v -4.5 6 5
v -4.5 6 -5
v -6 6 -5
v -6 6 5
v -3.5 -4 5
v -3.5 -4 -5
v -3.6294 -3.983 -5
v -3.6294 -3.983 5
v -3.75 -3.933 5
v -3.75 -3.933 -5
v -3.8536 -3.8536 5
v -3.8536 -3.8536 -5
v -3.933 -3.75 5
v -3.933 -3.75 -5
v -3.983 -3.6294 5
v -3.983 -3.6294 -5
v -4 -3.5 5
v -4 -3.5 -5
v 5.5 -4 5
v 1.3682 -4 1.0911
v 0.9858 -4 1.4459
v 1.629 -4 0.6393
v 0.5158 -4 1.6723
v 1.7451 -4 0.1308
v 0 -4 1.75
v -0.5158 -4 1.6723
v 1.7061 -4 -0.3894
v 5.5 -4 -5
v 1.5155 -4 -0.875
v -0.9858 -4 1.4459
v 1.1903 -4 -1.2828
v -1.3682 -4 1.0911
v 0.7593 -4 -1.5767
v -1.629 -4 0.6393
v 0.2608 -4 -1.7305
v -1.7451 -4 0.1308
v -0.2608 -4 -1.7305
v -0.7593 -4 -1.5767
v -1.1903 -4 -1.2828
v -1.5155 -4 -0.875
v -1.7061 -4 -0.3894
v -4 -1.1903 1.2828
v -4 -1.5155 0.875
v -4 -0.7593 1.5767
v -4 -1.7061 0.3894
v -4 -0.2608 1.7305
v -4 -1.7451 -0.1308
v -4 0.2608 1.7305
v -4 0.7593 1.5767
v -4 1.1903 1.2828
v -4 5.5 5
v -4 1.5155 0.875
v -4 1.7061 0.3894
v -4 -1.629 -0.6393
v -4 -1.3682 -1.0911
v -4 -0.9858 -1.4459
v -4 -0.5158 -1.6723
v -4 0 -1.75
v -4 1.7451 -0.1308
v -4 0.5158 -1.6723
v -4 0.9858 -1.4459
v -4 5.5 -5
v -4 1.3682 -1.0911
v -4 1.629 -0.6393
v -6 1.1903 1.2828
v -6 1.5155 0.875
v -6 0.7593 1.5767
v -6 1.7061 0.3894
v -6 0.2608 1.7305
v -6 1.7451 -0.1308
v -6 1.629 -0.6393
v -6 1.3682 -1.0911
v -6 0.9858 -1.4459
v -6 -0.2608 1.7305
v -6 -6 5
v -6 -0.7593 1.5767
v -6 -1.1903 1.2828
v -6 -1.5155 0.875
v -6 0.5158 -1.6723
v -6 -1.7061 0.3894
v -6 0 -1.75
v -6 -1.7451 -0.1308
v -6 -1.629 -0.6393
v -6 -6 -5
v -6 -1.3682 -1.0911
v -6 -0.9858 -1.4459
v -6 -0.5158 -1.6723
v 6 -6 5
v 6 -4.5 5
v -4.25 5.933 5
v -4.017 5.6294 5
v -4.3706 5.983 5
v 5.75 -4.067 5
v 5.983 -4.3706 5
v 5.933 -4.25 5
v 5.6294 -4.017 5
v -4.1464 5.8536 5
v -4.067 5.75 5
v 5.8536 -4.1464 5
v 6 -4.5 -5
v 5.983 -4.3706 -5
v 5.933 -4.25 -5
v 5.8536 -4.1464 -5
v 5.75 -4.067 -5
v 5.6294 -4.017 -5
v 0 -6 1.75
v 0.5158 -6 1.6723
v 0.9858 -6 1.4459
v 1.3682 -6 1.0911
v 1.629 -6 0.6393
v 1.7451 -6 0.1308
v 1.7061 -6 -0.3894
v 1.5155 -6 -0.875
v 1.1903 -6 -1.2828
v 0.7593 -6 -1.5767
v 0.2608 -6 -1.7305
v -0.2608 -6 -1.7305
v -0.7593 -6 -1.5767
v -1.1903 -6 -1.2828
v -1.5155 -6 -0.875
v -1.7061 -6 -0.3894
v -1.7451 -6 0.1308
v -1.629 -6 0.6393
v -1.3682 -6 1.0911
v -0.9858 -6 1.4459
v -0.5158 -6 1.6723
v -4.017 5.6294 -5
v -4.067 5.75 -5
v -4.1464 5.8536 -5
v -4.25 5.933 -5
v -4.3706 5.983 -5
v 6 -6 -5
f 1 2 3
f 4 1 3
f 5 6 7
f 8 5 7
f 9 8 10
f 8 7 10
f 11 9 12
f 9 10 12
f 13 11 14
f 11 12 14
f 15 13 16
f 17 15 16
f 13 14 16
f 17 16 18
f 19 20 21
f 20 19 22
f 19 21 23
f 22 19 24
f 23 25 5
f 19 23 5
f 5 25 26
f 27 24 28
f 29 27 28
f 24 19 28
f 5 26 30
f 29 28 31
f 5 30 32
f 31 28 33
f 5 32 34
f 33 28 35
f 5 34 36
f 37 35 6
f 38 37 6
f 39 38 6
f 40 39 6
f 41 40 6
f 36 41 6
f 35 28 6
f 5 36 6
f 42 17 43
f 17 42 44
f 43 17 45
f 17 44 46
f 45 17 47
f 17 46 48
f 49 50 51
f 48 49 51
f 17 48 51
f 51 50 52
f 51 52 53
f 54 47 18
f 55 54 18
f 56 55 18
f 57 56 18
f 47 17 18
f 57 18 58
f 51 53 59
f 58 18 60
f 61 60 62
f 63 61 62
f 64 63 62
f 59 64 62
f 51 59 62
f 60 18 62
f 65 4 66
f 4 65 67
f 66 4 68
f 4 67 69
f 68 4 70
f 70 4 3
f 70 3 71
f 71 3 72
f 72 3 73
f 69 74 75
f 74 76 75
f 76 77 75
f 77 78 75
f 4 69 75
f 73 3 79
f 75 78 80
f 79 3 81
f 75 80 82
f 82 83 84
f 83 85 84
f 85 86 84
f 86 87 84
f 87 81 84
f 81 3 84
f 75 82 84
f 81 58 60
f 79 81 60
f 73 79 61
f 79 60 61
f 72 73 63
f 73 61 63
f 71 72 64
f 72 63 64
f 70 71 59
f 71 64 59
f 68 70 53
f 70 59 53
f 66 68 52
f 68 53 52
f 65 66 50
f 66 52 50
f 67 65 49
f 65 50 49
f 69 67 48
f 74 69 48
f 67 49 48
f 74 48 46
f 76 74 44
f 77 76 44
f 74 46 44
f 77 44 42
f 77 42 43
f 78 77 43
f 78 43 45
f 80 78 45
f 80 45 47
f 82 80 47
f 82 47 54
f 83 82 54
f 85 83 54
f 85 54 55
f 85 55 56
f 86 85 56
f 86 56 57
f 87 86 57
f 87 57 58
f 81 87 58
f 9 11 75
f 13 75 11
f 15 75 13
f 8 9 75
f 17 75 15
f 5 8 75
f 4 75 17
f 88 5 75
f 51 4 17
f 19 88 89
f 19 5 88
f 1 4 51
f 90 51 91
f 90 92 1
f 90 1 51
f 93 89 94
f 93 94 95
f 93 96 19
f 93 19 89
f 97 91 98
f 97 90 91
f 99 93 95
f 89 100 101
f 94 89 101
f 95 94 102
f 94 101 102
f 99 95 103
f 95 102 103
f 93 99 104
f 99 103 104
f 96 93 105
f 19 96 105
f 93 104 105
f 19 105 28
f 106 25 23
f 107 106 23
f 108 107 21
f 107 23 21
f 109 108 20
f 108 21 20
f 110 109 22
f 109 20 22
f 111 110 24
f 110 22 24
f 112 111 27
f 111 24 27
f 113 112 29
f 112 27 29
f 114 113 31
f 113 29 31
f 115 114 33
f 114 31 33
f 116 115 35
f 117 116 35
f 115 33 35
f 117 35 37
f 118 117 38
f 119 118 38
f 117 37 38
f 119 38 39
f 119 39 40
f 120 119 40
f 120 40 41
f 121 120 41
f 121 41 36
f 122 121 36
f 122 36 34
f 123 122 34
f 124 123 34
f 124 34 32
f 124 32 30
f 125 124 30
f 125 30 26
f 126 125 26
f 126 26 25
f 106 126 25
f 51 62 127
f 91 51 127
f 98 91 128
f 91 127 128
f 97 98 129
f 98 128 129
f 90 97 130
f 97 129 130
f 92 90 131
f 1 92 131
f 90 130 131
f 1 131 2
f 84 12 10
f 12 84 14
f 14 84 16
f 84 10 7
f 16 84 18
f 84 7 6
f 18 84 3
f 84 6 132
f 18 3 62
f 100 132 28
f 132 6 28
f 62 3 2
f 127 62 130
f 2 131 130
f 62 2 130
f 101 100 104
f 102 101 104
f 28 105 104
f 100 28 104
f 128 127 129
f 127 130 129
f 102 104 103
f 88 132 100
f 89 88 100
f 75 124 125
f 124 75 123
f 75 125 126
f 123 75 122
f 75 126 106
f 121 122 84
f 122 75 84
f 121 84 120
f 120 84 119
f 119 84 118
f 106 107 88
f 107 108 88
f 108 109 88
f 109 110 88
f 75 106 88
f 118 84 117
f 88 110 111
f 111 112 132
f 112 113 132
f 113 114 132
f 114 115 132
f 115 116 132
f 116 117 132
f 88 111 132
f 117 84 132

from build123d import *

# Parameters (mm, degrees)
BOSS_EXTRUDE1_START = -5
BOSS_EXTRUDE1_DEPTH = 10
SKETCH5_R           = 1.75
CUT_EXTRUDE1_DEPTH  = 10.848857802
SKETCH6_R           = 1.75
CUT_EXTRUDE2_DEPTH  = 10.848857802


with BuildPart() as part:
    # Sketch4 → Boss-Extrude1 (new body)
    with BuildSketch(Plane.XY.offset(BOSS_EXTRUDE1_START)):
        with BuildLine():
            Line((-6, 6), (-6, -6))
            Line((-6, -6), (6, -6))
            Line((6, -6), (6, -4.5))
            ThreePointArc((6, -4.5), (5.853553391, -4.146446609), (5.5, -4))
            Line((5.5, -4), (-3.5, -4))
            ThreePointArc((-3.5, -4), (-3.853553391, -3.853553391), (-4, -3.5))
            Line((-4, -3.5), (-4, 5.5))
            ThreePointArc((-4, 5.5), (-4.146446609, 5.853553391), (-4.5, 6))
            Line((-4.5, 6), (-6, 6))
        make_face()
    extrude(amount=BOSS_EXTRUDE1_DEPTH)

    # Sketch5 → Cut-Extrude1 (cut, through all)
    with BuildSketch(Plane(origin=(0, 0, 0), x_dir=(0, 0, -1), z_dir=(1, 0, 0))):
        Circle(SKETCH5_R)
    extrude(amount=-CUT_EXTRUDE1_DEPTH, mode=Mode.SUBTRACT)

    # Sketch6 → Cut-Extrude2 (cut, through all)
    with BuildSketch(Plane(origin=(0, 0, 0), x_dir=(1, 0, 0), z_dir=(0, 1, 0))):
        with Locations(Location((0, 0, 0), (0, 0, 270))):
            Circle(SKETCH6_R)
    extrude(amount=-CUT_EXTRUDE2_DEPTH, mode=Mode.SUBTRACT)


solid = part.part
